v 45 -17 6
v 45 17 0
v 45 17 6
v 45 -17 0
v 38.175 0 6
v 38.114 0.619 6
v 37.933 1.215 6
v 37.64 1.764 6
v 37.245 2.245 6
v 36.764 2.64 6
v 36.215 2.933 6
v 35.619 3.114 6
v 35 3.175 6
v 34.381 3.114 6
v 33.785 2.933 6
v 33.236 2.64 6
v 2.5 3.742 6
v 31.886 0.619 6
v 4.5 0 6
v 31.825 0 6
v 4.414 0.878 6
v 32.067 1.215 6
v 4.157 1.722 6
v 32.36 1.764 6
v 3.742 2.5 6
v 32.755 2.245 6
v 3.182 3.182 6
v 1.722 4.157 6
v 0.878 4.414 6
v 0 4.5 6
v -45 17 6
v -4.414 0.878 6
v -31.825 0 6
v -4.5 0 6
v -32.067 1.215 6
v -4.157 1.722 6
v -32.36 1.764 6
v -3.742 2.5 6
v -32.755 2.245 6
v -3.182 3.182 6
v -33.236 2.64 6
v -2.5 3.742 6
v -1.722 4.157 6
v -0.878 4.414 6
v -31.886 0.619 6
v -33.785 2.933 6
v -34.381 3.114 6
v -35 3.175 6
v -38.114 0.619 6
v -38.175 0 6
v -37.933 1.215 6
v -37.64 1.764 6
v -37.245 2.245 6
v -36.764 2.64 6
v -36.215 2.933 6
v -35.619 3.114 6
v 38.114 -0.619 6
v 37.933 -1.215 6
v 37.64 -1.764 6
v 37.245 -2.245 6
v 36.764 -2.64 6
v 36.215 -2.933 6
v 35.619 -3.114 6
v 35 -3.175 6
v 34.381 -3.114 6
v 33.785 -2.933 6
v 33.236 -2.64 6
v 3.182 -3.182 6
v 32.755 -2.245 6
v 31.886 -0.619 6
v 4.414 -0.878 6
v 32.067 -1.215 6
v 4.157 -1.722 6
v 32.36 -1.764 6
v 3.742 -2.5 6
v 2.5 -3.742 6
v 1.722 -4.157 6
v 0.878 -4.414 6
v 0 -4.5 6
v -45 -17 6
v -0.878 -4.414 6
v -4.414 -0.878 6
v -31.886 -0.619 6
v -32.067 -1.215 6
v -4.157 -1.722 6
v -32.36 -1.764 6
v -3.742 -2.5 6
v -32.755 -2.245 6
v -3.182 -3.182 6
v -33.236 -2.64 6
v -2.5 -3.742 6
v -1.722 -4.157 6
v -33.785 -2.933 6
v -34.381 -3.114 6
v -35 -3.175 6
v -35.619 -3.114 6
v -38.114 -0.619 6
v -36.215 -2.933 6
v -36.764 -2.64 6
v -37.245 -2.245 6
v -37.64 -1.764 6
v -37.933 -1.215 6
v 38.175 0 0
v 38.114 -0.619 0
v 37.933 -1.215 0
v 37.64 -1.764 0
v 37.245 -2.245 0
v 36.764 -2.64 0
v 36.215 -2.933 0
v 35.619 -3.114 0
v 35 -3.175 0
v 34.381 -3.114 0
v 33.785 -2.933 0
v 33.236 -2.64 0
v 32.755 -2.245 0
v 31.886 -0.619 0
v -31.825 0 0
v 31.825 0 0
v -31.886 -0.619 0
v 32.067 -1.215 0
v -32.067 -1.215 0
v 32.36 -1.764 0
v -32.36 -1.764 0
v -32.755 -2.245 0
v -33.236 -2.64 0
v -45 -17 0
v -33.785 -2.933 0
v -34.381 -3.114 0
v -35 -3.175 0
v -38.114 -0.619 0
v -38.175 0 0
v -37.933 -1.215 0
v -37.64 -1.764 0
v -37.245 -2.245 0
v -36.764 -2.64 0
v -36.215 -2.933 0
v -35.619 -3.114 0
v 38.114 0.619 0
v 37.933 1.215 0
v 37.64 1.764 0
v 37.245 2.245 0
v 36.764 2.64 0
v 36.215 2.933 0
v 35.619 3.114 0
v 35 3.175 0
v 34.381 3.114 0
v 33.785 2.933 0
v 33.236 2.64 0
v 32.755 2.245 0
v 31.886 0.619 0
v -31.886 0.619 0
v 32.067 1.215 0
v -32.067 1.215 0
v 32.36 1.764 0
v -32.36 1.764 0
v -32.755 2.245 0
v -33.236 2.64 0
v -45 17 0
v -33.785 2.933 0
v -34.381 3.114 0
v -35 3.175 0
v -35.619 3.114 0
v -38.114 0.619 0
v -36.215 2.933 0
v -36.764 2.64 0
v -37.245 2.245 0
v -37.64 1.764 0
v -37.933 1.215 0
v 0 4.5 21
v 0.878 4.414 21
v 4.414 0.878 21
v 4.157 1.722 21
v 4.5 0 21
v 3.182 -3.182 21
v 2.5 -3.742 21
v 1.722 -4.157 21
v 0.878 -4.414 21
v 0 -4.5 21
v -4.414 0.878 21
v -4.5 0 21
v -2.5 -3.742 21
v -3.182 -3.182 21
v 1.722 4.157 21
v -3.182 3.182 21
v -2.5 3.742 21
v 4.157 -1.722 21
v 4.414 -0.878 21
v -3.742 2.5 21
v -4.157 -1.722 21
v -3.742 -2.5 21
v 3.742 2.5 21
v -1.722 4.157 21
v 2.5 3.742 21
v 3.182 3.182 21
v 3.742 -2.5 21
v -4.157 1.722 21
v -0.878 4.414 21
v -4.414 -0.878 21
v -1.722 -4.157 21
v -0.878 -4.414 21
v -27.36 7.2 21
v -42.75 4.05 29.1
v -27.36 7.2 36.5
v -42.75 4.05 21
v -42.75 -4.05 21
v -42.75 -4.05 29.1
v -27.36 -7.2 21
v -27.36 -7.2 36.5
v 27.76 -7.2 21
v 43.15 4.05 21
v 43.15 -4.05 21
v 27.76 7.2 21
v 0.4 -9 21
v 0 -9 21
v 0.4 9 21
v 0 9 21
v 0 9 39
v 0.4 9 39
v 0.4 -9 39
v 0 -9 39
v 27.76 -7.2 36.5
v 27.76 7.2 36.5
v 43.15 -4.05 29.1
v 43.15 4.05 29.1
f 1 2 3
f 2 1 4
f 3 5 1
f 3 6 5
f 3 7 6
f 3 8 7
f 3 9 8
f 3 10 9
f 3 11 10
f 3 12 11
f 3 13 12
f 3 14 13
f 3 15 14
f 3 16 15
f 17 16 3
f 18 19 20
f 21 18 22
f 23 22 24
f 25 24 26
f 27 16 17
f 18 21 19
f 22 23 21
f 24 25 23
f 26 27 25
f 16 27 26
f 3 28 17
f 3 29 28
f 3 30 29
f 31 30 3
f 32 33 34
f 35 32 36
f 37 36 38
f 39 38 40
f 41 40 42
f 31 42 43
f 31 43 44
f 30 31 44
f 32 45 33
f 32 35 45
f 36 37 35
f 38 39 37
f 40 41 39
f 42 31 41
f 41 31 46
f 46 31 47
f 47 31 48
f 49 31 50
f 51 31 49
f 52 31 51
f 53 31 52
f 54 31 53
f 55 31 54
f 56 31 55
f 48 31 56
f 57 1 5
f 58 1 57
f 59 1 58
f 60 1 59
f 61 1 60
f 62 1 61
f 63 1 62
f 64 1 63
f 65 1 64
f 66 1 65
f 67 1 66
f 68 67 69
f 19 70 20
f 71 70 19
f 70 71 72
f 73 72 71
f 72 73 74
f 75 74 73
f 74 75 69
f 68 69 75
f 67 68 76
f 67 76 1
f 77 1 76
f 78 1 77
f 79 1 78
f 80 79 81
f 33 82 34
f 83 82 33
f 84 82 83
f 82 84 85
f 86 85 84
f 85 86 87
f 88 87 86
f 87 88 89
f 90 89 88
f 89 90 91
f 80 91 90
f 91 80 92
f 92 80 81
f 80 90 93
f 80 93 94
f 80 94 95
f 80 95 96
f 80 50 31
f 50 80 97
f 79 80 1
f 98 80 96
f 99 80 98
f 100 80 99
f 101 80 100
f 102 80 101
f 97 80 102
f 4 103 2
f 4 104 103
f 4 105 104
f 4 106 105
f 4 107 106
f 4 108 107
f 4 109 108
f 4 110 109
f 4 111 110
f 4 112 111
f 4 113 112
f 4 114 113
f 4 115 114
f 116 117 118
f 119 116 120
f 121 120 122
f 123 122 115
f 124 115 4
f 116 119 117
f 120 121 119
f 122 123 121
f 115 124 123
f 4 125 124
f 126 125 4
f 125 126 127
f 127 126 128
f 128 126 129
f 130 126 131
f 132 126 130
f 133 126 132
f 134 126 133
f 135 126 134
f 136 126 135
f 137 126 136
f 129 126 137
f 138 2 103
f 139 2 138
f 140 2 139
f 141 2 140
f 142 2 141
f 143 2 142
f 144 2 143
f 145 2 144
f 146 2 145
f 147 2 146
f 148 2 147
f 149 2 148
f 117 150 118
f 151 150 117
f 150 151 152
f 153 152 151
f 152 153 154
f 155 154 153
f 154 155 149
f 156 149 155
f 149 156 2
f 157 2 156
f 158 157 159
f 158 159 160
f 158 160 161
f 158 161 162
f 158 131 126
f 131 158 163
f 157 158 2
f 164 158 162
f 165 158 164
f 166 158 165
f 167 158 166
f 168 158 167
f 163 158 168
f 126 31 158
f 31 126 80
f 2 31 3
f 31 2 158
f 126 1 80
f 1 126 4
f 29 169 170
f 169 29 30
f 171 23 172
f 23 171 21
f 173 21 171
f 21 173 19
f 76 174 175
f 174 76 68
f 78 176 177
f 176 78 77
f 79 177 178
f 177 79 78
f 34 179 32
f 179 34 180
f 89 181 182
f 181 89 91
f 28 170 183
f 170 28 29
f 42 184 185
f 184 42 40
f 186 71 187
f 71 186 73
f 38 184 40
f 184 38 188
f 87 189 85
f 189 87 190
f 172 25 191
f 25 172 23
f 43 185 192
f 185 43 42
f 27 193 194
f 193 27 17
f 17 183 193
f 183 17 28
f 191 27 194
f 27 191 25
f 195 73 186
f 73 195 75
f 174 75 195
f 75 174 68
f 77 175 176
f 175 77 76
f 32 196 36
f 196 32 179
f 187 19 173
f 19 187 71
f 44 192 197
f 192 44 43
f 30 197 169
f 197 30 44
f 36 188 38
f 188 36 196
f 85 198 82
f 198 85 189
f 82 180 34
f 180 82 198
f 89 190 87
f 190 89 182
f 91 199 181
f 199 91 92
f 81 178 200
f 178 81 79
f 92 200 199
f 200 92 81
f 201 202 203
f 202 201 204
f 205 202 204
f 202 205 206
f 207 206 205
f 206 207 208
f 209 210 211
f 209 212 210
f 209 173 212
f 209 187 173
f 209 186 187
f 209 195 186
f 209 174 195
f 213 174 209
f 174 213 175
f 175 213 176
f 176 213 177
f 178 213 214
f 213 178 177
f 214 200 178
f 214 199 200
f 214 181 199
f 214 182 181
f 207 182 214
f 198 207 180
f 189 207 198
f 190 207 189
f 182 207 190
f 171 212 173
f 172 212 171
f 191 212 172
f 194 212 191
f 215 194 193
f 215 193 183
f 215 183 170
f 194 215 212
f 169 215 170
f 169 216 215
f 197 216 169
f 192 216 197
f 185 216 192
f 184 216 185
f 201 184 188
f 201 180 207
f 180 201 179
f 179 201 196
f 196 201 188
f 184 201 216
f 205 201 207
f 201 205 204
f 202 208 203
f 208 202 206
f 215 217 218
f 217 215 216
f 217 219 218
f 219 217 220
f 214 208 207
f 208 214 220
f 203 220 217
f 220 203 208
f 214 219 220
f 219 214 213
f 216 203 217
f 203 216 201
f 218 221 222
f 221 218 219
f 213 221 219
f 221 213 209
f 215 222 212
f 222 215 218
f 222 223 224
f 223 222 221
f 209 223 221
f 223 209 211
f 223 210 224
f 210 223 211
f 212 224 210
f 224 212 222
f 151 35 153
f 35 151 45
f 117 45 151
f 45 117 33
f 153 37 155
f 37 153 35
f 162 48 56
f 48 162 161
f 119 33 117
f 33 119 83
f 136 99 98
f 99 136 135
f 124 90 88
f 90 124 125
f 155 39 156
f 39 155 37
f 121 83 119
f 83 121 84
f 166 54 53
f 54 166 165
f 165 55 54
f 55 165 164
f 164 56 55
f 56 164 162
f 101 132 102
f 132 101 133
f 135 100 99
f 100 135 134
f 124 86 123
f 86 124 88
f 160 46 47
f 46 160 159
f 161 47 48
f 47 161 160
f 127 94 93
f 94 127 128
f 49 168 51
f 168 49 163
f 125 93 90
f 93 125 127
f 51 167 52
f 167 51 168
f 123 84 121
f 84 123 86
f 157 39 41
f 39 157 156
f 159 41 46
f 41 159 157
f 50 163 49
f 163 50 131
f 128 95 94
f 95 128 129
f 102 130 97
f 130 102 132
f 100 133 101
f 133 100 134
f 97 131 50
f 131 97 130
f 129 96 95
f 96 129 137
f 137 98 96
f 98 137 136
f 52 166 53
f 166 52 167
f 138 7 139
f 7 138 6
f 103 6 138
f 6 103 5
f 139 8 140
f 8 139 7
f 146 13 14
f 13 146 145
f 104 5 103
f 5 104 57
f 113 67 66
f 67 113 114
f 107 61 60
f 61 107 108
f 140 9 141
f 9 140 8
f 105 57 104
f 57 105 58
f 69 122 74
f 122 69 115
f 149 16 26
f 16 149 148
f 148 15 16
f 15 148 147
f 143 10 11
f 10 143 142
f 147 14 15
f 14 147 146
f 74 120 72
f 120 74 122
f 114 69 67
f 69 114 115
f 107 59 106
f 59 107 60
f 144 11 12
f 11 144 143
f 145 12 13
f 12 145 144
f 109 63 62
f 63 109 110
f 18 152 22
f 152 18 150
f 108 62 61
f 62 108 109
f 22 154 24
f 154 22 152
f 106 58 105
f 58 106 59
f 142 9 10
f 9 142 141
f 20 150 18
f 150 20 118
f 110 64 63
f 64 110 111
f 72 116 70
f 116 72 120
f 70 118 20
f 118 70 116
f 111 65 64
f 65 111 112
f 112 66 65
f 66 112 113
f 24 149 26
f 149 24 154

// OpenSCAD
$fn = 32;

// ----------------------------------------------------------------------
// Boat cleat: 90 mm base, horn 30 mm up
// ----------------------------------------------------------------------

// --- parameters (mm) ---
base_l = 90;              // base length
base_w = 34;              // base width
base_t = 6;               // base thickness
horn_len = 85.5;          // horn length
horn_d = 18;              // horn diameter at the middle
horn_z = 30;              // horn axis height
end_drop = 10;            // how far the horn tips drop
post_d = 9;               // centre post diameter
holes_d = 6.35;           // fixing holes
hole_x = 35;              // fixing hole spacing

difference() {
  union() {
    translate([-45, -17, 0]) cube([base_l, base_w, base_t]);
    /* centre post, sunk 1 mm into the base */
    translate([0, 0, 5]) cylinder(h = 25, d = post_d);
    /* horn: a hull chain of boxes, full in the middle and lighter at the tips */
    hull() {
      translate([-42.75, -4.05, 21]) cube([0.4, 8.1, 8.1], center = false);
      translate([-27.36, -7.2, 21]) cube([0.4, 14.4, 15.5], center = false);
    }
    hull() {
      translate([-27.36, -7.2, 21]) cube([0.4, 14.4, 15.5], center = false);
      translate([0, -9, 21]) cube([0.4, 18, 18], center = false);
    }
    hull() {
      translate([0, -9, 21]) cube([0.4, 18, 18], center = false);
      translate([27.36, -7.2, 21]) cube([0.4, 14.4, 15.5], center = false);
    }
    hull() {
      translate([27.36, -7.2, 21]) cube([0.4, 14.4, 15.5], center = false);
      translate([42.75, -4.05, 21]) cube([0.4, 8.1, 8.1], center = false);
    }
  }
  translate([-35, 0, -2.5]) cylinder(h = base_t + 5, d = holes_d);
  translate([35, 0, -2.5]) cylinder(h = base_t + 5, d = holes_d);
}
